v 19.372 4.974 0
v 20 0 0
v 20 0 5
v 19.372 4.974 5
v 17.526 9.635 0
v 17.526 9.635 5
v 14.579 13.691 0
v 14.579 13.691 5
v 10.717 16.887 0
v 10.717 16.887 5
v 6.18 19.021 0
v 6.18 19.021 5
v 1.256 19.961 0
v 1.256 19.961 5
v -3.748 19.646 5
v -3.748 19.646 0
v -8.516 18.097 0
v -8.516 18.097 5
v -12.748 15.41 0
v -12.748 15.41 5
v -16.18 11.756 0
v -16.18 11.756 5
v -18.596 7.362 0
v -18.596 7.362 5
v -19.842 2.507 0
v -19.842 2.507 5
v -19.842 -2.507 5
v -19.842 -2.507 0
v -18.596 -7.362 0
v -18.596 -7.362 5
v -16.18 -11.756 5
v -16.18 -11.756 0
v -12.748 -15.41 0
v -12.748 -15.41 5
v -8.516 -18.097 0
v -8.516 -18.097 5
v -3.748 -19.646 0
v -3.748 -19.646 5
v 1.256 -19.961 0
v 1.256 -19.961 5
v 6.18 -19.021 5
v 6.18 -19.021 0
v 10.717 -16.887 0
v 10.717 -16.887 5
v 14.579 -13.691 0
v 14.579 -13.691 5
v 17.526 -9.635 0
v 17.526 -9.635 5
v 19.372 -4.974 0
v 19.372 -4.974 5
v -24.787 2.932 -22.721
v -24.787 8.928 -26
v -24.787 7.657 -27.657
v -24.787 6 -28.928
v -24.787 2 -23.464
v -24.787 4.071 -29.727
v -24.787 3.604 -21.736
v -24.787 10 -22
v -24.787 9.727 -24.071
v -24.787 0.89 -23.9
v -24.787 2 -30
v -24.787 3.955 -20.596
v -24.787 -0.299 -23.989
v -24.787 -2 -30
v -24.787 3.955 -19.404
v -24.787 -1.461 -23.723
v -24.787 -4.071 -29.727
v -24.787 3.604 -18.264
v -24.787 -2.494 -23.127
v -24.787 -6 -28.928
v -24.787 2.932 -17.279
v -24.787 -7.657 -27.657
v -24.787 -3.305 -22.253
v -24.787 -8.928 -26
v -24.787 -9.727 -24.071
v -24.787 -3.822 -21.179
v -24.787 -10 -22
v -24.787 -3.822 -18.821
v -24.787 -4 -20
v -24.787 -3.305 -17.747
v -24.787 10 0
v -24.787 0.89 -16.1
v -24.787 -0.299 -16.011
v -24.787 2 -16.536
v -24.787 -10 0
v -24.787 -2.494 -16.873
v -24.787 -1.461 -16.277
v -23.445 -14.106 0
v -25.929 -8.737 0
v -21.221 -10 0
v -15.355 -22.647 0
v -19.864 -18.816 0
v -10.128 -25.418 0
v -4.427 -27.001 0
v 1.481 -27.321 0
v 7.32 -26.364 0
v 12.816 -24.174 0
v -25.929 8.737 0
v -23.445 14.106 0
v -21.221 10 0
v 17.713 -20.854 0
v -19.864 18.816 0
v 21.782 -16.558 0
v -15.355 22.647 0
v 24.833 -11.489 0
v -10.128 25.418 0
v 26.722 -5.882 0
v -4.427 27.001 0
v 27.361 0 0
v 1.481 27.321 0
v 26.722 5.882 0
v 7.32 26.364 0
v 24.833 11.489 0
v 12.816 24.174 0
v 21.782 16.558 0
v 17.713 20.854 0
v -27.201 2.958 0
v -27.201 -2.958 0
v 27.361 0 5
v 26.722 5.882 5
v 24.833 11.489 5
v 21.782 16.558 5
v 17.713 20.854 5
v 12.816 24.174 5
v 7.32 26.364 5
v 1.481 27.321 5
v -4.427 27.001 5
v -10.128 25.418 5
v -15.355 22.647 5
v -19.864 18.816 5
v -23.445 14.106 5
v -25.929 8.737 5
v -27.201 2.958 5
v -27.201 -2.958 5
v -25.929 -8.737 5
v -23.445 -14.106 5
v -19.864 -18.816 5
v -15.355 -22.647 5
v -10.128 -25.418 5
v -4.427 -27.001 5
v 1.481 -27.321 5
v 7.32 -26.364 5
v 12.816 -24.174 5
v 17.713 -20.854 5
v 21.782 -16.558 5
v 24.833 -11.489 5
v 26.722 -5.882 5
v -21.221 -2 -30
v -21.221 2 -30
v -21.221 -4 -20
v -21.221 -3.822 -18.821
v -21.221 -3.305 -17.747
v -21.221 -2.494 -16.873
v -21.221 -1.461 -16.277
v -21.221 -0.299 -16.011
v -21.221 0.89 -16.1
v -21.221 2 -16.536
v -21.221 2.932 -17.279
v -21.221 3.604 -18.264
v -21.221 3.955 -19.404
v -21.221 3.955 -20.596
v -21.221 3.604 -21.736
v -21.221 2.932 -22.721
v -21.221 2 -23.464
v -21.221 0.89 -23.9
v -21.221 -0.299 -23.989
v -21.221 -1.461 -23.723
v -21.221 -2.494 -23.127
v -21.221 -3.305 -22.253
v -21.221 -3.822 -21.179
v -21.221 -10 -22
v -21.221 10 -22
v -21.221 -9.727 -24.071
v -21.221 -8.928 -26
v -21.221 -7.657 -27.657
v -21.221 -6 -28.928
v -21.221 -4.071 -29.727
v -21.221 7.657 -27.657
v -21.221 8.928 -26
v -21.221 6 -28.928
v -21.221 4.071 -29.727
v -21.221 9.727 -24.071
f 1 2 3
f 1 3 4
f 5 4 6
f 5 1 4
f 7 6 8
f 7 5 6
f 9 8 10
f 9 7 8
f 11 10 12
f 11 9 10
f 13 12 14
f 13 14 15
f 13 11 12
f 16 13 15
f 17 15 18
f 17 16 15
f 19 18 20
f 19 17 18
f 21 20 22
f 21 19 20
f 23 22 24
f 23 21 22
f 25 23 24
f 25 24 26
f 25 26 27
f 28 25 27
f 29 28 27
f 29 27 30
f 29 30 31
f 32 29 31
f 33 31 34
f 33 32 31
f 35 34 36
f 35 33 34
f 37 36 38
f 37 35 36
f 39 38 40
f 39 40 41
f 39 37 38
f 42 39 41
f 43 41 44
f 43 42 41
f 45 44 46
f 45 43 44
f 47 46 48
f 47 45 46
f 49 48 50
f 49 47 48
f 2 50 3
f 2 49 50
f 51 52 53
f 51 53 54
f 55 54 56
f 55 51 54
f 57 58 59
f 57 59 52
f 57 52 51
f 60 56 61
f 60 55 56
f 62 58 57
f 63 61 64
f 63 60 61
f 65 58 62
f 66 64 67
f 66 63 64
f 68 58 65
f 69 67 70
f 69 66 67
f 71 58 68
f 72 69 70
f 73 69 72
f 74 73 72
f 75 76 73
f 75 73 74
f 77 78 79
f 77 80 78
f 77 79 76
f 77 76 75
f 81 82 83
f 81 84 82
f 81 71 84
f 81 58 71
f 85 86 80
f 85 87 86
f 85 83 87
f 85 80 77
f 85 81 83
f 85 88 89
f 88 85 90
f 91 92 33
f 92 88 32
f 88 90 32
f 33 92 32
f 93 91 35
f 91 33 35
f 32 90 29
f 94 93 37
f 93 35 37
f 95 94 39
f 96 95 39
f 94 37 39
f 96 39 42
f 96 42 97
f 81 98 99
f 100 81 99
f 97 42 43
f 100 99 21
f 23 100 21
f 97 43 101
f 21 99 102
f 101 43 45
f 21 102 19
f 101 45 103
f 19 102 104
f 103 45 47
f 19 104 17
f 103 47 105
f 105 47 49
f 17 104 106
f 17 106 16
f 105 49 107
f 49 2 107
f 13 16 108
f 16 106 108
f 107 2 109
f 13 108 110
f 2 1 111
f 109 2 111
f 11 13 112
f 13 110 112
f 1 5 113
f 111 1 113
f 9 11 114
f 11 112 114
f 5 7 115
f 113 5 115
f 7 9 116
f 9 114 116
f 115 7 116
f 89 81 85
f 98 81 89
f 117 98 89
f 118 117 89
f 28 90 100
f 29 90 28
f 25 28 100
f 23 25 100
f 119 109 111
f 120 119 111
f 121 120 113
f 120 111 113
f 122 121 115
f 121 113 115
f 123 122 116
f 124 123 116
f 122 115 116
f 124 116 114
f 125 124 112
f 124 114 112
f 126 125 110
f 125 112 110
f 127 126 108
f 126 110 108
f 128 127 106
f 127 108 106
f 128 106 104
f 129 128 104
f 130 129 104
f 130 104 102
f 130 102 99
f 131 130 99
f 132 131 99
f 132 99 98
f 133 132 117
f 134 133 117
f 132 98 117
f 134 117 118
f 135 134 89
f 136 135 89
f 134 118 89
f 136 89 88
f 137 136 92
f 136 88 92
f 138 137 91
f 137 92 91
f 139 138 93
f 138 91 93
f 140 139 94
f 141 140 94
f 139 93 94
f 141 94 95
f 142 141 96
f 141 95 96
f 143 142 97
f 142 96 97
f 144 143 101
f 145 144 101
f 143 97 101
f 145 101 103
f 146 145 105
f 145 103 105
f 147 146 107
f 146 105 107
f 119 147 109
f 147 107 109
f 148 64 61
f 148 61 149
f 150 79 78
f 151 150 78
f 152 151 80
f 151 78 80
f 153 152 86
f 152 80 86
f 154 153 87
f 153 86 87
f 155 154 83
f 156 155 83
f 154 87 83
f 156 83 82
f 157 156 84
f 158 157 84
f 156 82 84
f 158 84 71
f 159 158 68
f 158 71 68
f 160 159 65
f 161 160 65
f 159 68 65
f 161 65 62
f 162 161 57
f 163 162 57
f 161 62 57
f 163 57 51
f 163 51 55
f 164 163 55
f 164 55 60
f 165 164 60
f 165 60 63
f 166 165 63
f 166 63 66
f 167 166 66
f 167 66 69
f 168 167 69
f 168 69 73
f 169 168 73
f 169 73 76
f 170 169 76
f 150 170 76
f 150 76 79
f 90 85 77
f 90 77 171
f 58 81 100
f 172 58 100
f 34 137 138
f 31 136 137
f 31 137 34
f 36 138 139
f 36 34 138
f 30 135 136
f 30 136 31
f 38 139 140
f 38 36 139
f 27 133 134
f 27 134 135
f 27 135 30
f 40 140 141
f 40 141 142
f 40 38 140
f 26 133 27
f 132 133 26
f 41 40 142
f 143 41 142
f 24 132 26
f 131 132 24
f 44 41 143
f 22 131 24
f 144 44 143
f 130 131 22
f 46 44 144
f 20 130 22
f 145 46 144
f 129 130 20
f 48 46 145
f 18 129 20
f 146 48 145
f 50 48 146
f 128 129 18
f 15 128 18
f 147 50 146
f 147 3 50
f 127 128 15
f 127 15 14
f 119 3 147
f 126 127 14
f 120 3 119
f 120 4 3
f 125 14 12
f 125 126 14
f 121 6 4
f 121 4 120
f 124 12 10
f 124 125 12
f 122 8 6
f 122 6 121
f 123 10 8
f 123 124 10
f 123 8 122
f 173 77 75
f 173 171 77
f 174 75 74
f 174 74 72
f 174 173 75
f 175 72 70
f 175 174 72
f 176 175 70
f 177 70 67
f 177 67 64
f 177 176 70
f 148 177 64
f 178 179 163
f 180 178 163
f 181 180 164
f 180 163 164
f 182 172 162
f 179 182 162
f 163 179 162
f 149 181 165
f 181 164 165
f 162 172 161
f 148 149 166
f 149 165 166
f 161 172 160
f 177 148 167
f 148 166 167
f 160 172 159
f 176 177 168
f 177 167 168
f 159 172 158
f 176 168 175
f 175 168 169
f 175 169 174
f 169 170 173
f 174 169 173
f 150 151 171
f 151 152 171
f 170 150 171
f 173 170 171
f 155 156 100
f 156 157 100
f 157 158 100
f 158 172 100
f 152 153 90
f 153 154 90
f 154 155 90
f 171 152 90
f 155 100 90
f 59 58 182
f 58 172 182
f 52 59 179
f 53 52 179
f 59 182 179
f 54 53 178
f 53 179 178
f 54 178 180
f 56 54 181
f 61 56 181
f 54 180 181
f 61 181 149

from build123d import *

# Parameters (mm, degrees)
F0_R     = 27.361448
F0_R_2   = 20
F1_DEPTH = 5
F2_W     = 3.56566
F2_H     = 20
F3_DEPTH = 30
F4_R     = 4
F5_DEPTH = 25
F6_R     = 8


with BuildPart() as f1:
    # F0 (on Top) → F1 (new body)
    with BuildSketch(Plane.XY):
        Circle(F0_R)
        Circle(F0_R_2, mode=Mode.SUBTRACT)
    extrude(amount=F1_DEPTH)

    # F2 (on face) → F3 (join)
    with BuildSketch(Plane(origin=(0, 0, 0), x_dir=(1, 0, 0), z_dir=(0, 0, -1))):
        with Locations((-23.004174, 0)):
            Rectangle(F2_W, F2_H)
    extrude(amount=F3_DEPTH)

    # F4 (on face) → F5 (cut)
    with BuildSketch(Plane(origin=(-24.787004, 0, 0), x_dir=(0, -1, 0), z_dir=(-1, 0, 0))):
        with Locations((0, -20)):
            Circle(F4_R)
    extrude(amount=-F5_DEPTH, mode=Mode.SUBTRACT)

    # F6
    f6_edges = [f1.edges().sort_by_distance(p)[0] for p in [
        (-23.004174, -10, -30),
        (-23.004174, 10, -30),
    ]]
    fillet(f6_edges, radius=F6_R)


solid = f1.part
